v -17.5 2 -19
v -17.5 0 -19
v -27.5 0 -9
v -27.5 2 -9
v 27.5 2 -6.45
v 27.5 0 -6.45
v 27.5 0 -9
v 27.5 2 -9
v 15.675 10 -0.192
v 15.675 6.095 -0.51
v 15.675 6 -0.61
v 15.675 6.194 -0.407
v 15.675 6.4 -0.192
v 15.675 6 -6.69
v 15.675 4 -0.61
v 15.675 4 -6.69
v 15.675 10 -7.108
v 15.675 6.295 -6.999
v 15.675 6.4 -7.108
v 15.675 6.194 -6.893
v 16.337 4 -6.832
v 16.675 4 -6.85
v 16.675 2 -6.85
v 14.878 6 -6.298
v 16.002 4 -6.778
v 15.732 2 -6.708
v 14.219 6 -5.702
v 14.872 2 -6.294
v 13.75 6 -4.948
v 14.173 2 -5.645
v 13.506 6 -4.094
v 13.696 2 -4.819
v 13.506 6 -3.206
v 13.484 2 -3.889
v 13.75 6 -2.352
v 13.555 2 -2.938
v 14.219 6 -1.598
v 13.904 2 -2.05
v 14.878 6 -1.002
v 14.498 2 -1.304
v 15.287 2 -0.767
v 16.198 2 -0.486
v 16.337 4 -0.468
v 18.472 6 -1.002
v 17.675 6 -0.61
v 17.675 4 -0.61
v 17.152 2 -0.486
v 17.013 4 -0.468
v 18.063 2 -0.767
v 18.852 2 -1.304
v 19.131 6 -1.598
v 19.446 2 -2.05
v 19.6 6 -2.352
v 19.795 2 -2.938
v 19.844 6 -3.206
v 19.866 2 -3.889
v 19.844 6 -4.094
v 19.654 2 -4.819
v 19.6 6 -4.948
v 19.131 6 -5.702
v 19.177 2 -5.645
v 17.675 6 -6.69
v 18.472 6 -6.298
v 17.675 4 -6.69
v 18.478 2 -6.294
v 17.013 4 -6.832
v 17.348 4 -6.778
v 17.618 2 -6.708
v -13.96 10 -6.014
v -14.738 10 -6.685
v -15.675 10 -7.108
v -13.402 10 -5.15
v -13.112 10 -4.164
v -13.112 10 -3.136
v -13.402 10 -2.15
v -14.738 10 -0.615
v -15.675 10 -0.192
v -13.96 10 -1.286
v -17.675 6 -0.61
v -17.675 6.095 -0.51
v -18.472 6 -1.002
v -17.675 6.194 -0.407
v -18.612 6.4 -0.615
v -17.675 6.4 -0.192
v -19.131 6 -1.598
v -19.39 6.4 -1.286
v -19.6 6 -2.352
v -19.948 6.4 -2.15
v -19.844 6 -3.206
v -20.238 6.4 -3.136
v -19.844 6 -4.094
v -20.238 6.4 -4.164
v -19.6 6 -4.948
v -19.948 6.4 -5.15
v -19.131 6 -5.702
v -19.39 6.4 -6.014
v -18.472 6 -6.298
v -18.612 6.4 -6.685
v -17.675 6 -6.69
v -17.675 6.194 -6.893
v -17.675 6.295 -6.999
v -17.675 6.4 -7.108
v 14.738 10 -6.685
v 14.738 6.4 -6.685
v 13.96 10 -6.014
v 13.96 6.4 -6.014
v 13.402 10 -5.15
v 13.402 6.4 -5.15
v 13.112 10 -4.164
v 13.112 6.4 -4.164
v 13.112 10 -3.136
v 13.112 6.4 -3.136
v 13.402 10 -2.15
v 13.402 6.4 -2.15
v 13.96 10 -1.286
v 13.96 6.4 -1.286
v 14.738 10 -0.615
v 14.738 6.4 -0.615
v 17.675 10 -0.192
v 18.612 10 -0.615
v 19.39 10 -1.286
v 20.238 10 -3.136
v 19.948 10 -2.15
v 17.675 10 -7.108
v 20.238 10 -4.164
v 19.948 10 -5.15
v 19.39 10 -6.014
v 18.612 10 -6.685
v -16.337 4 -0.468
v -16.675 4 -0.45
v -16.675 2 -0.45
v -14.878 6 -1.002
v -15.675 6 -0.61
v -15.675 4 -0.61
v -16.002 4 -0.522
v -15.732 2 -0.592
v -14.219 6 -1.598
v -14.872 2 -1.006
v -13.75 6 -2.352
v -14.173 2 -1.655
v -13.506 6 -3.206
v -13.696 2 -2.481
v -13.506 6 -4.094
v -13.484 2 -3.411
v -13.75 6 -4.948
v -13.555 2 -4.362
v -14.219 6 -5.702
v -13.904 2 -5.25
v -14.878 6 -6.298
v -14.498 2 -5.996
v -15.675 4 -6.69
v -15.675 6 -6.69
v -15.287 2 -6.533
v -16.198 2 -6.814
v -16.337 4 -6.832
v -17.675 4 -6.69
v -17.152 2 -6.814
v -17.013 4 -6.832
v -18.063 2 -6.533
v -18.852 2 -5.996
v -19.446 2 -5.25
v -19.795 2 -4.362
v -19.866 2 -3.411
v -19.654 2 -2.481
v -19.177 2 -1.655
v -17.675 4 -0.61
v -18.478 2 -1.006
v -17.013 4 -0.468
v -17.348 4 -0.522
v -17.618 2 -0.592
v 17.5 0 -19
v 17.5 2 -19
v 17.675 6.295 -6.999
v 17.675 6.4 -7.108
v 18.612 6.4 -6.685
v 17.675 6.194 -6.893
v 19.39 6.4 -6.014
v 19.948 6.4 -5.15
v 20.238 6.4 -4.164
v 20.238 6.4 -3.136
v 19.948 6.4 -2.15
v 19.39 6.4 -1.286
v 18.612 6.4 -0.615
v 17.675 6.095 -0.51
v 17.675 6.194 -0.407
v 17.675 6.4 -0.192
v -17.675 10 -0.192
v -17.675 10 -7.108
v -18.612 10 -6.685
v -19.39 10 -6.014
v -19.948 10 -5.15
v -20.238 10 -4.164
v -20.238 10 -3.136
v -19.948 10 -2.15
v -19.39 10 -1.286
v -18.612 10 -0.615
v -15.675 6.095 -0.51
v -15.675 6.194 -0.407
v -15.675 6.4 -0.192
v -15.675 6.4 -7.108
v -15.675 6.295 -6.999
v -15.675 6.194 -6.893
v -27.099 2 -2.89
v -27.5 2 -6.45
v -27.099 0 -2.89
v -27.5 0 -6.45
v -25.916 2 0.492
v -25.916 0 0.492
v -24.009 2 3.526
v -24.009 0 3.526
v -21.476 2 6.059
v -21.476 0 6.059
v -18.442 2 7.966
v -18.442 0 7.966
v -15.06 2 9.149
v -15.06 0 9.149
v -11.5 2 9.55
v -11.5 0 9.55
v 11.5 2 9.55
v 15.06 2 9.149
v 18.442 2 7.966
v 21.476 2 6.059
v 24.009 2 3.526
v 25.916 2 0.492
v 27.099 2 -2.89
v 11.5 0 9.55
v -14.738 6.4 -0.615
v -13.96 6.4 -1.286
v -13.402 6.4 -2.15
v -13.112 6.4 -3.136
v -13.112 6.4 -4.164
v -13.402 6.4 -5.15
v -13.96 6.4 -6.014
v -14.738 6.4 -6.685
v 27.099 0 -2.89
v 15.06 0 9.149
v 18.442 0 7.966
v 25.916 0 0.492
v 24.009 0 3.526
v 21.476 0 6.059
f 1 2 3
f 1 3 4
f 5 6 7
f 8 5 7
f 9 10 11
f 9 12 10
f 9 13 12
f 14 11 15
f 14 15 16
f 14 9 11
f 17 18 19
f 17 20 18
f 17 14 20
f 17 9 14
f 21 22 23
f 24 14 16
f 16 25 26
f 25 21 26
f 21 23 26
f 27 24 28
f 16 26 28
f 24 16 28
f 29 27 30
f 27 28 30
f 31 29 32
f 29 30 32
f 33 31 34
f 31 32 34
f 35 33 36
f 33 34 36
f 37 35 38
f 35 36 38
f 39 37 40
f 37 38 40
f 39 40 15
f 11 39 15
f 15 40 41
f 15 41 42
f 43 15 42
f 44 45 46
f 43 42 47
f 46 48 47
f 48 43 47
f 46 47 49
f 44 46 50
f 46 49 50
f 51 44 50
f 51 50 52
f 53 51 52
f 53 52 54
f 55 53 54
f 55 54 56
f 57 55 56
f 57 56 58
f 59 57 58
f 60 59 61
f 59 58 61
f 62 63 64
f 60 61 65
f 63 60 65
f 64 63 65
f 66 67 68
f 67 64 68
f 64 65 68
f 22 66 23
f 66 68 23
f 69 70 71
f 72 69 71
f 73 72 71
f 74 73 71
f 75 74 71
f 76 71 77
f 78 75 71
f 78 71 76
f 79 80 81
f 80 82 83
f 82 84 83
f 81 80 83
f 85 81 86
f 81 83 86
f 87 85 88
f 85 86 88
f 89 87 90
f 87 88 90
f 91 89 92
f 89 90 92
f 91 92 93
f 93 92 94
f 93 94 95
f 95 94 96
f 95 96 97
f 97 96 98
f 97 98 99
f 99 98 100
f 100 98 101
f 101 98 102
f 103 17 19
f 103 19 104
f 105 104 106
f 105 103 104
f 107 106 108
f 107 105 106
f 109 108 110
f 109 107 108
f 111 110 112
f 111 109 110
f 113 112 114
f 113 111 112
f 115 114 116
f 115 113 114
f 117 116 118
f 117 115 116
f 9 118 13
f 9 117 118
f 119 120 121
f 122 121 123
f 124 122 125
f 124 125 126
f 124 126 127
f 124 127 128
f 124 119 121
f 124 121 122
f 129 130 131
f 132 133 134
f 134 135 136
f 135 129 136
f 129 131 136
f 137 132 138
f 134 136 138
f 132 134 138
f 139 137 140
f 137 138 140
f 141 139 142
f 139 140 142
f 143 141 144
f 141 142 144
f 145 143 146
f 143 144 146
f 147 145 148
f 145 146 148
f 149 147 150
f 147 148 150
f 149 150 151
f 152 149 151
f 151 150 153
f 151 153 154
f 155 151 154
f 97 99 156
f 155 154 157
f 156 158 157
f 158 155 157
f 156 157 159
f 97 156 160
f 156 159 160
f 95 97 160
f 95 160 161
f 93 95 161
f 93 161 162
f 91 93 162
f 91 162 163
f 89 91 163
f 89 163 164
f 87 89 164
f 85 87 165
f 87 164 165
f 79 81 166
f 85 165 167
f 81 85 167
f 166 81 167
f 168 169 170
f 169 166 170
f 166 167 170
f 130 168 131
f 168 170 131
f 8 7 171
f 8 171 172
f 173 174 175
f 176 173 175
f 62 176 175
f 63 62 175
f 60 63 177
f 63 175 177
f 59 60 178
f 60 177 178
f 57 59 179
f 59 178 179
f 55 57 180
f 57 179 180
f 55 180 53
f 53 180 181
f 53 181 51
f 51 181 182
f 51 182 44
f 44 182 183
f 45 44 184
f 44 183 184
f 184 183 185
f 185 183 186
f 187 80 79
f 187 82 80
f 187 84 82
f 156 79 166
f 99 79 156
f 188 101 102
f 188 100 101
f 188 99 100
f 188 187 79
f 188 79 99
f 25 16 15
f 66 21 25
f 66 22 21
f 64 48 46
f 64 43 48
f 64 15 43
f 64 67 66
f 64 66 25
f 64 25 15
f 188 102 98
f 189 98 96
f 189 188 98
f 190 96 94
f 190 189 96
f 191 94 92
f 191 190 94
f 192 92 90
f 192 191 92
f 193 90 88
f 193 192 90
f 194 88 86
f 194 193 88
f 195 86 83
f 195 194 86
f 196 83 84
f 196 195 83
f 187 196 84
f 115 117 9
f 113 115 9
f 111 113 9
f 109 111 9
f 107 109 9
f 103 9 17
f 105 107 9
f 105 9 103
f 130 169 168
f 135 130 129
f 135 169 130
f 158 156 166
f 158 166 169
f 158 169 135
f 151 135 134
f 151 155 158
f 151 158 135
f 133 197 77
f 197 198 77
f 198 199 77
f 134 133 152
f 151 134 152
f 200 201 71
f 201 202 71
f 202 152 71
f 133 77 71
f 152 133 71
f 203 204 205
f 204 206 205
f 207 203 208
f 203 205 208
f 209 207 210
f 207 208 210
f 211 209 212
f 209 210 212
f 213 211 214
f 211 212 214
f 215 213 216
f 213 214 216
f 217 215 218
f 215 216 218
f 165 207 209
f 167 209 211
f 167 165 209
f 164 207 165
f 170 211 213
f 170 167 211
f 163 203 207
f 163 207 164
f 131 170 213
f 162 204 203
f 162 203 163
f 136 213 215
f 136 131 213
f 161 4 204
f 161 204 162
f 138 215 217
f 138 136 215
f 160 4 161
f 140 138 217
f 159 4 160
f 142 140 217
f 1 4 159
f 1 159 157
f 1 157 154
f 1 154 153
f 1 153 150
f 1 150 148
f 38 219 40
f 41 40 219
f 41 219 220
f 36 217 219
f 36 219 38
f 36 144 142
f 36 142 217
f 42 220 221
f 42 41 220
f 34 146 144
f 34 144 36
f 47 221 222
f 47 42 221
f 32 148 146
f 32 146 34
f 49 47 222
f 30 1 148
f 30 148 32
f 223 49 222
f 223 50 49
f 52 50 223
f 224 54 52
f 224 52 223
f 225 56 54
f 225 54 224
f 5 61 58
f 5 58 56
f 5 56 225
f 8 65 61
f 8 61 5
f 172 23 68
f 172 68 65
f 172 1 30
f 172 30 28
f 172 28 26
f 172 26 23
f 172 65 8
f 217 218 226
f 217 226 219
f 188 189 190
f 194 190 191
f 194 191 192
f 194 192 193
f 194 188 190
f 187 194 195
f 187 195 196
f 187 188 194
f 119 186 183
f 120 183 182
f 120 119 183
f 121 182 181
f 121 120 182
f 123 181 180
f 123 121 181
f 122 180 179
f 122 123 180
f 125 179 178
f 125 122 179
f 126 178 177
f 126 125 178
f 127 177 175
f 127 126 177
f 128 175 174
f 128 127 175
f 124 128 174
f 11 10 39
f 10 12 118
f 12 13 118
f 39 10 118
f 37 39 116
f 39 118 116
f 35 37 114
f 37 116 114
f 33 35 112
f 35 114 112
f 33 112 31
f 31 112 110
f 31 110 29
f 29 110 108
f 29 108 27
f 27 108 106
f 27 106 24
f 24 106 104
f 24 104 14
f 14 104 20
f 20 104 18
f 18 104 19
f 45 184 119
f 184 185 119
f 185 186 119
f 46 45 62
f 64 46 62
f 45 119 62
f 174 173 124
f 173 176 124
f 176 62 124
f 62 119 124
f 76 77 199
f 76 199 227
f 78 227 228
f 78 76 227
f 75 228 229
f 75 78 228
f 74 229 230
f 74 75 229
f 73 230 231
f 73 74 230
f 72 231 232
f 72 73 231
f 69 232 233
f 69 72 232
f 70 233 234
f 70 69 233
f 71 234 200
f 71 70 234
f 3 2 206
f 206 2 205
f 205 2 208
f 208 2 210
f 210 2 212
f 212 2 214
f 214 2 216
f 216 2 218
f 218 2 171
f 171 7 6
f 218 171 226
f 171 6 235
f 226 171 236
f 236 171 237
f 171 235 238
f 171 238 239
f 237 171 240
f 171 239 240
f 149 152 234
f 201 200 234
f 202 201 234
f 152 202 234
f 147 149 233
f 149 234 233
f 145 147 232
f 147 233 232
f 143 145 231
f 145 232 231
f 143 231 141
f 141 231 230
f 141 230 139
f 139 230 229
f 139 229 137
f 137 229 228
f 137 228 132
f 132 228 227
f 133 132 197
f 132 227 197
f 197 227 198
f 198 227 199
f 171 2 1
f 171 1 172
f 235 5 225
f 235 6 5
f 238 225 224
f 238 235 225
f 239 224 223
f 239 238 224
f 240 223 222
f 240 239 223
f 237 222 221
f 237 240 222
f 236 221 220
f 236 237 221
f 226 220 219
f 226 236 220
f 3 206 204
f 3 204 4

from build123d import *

# Parameters (mm, degrees)
SKETCH2_W               = 55
SKETCH2_H               = 38
BOSS_EXTRUDE1_DEPTH     = 2
SKETCH3_R               = 3.2
BOSS_EXTRUDE2_DEPTH     = 10
SKETCH4_R               = 3.6
BOSS_EXTRUDE3_DEPTH     = 1
CHAMFER1_SIZE           = 3
SKETCH5_W               = 2
SKETCH5_H               = 10.684354826
CUT_EXTRUDE1_DEPTH      = 6
CHAMFER2_SIZE           = 10
CUT_EXTRUDE2_DEPTH      = 35.889110049
CUT_EXTRUDE2_DEPTH_BACK = 35.889110049
SKETCH8_W               = 9.45
SKETCH8_H               = 2
FILLET2_R               = 16


with BuildPart() as part:
    # Sketch2 → Boss-Extrude1 (new body)
    with BuildSketch(Plane(origin=(0, 0, 0), x_dir=(1, 0, 0), z_dir=(0, 1, 0))):
        Rectangle(SKETCH2_W, SKETCH2_H)
    extrude(amount=BOSS_EXTRUDE1_DEPTH)

    # Sketch3 → Boss-Extrude2 (add)
    with BuildSketch(Plane(origin=(0, 0, 0), x_dir=(1, 0, 0), z_dir=(0, 1, 0))):
        with Locations(Location((-16.675, 3.65, 0), (0, 0, 270))):
            Circle(SKETCH3_R)
        with Locations(Location((16.675, 3.65, 0), (0, 0, 90))):
            Circle(SKETCH3_R)
    extrude(amount=BOSS_EXTRUDE2_DEPTH)

    # Sketch4 → Boss-Extrude3 (add)
    with BuildSketch(Plane(origin=(0, 10, 0), x_dir=(1, 0, 0), z_dir=(0, 1, 0))):
        with Locations(Location((-16.675, 3.65, 0), (0, 0, 270))):
            Circle(SKETCH4_R)
        with Locations(Location((16.675, 3.65, 0), (0, 0, 90))):
            Circle(SKETCH4_R)
    extrude(amount=-BOSS_EXTRUDE3_DEPTH)

    # Chamfer1
    # the kernel refuses this chamfer: 3 mm, written as the material it adds along each edge
    with BuildSketch(Plane(origin=(16.675, 9, -3.65), x_dir=(0, 0, -1), z_dir=(-1, 0, 0))) as chamfer1_piece_1_section:
        Polygon((3.2, CHAMFER1_SIZE), (3.2 + CHAMFER1_SIZE, 0), (3.2, 0), align=None)
    chamfer1_piece_1 = revolve(axis=Axis((16.675, 9, -3.65), (0, -1, 0)), mode=Mode.PRIVATE)
    chamfer1_piece_1 = chamfer1_piece_1 & Plane(origin=(16.675, 6.179265151, -3.65), x_dir=(0, 0, -1), z_dir=(0, 1, 0)) * Cylinder(3.6, 25, mode=Mode.PRIVATE)
    add(chamfer1_piece_1)
    with BuildSketch(Plane(origin=(-16.675, 9, -3.65), x_dir=(0, 0, 1), z_dir=(1, 0, 0))) as chamfer1_piece_2_section:
        Polygon((3.2, CHAMFER1_SIZE), (3.2 + CHAMFER1_SIZE, 0), (3.2, 0), align=None)
    chamfer1_piece_2 = revolve(axis=Axis((-16.675, 9, -3.65), (0, -1, 0)), mode=Mode.PRIVATE)
    chamfer1_piece_2 = chamfer1_piece_2 & Plane(origin=(-16.675, 6.179265151, -3.65), x_dir=(0, 0, 1), z_dir=(0, 1, 0)) * Cylinder(3.6, 25, mode=Mode.PRIVATE)
    add(chamfer1_piece_2)

    # Sketch5 → Cut-Extrude1 (cut)
    with BuildSketch(Plane(origin=(0, 10, 0), x_dir=(1, 0, 0), z_dir=(0, 1, 0))):
        with Locations((16.675, 3.65)):
            Rectangle(SKETCH5_W, SKETCH5_H)
        with Locations((-16.675, 3.65)):
            Rectangle(SKETCH5_W, SKETCH5_H)
    extrude(amount=-CUT_EXTRUDE1_DEPTH, mode=Mode.SUBTRACT)

    # Chamfer2
    chamfer2_edges = [part.edges().sort_by_distance(p)[0] for p in [
        (-27.5, 1, -19),
        (27.5, 1, -19),
    ]]
    chamfer(chamfer2_edges, length=CHAMFER2_SIZE)

    # Sketch8 → Cut-Extrude2 (cut, two sides: drawn at the far end of the back side and taken through both)
    with BuildSketch(Plane.ZY.offset(-CUT_EXTRUDE2_DEPTH_BACK)):
        with Locations((14.275, 1)):
            Rectangle(SKETCH8_W, SKETCH8_H)
    extrude(amount=CUT_EXTRUDE2_DEPTH + CUT_EXTRUDE2_DEPTH_BACK, mode=Mode.SUBTRACT)

    # Fillet2
    fillet2_edges = [part.edges().sort_by_distance(p)[0] for p in [
        (27.5, 1, 9.55),
        (-27.5, 1, 9.55),
    ]]
    fillet(fillet2_edges, radius=FILLET2_R)


solid = part.part
